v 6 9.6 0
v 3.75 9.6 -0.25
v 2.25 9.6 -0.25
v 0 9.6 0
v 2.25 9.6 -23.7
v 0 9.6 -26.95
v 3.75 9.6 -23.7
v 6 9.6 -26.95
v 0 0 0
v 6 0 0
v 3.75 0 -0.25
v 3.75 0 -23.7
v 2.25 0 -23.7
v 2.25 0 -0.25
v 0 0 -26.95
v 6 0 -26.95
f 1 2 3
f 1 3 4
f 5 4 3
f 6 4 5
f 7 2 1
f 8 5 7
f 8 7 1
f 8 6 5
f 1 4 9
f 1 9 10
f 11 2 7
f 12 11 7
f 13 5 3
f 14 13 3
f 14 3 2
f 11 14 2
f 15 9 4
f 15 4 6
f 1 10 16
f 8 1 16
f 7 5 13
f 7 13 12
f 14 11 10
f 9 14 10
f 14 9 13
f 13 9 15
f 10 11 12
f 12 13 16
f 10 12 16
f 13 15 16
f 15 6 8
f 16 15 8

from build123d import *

# Parameters (mm, degrees)
SKETCH2_W           = 6
SKETCH2_H           = 26.95
BOSS_EXTRUDE1_DEPTH = 9.6
CUT_EXTRUDE2_DEPTH  = 9.6
SKETCH7_W           = 1.5
SKETCH7_H           = 0.25
BOSS_EXTRUDE2_DEPTH = 9.6
SKETCH8_W           = 1.5
SKETCH8_H           = 3.25
BOSS_EXTRUDE3_DEPTH = 9.6


with BuildPart() as part:
    # Sketch2 → Boss-Extrude1 (new body)
    with BuildSketch(Plane(origin=(0, 0, 0), x_dir=(1, 0, 0), z_dir=(0, 1, 0))):
        with Locations((3, 13.475)):
            Rectangle(SKETCH2_W, SKETCH2_H)
    extrude(amount=BOSS_EXTRUDE1_DEPTH)

    # Sketch3 → Cut-Extrude2 (cut)
    with BuildSketch(Plane(origin=(0, 9.6, 0), x_dir=(1, 0, 0), z_dir=(0, 1, 0))):
        Polygon((3, 26.95), (2.25, 26.95), (2.25, 0), (3.75, 0), (3.75, 26.95), align=None)
    extrude(amount=-CUT_EXTRUDE2_DEPTH, mode=Mode.SUBTRACT)


with BuildPart() as cut_extrude2_piece_1:
    # of the separate pieces the step leaves, piece 1, a body of its own (cut_extrude2_pieces)
    add(part.part.solids().sort_by_distance((6, 0, 0))[0])



with BuildPart() as cut_extrude2_piece_2:
    # of the separate pieces the step leaves, piece 2, a body of its own (cut_extrude2_pieces)
    add(part.part.solids().sort_by_distance((0, 0, 0))[0])


with BuildPart() as cut_extrude2_piece_1_1:
    add(cut_extrude2_piece_1.part)

    add(cut_extrude2_piece_2.part)  # Boss-Extrude2 merges Cut-Extrude2 piece 2
    # Sketch7 → Boss-Extrude2 (add)
    with BuildSketch(Plane(origin=(0, 9.6, 0), x_dir=(1, 0, 0), z_dir=(0, 1, 0))):
        with Locations((3, 0.125)):
            Rectangle(SKETCH7_W, SKETCH7_H)
    extrude(amount=-BOSS_EXTRUDE2_DEPTH)

    # Sketch8 → Boss-Extrude3 (add)
    with BuildSketch(Plane(origin=(0, 9.6, 0), x_dir=(1, 0, 0), z_dir=(0, 1, 0))):
        with Locations((3, 25.325)):
            Rectangle(SKETCH8_W, SKETCH8_H)
    extrude(amount=-BOSS_EXTRUDE3_DEPTH)


solid = cut_extrude2_piece_1_1.part
